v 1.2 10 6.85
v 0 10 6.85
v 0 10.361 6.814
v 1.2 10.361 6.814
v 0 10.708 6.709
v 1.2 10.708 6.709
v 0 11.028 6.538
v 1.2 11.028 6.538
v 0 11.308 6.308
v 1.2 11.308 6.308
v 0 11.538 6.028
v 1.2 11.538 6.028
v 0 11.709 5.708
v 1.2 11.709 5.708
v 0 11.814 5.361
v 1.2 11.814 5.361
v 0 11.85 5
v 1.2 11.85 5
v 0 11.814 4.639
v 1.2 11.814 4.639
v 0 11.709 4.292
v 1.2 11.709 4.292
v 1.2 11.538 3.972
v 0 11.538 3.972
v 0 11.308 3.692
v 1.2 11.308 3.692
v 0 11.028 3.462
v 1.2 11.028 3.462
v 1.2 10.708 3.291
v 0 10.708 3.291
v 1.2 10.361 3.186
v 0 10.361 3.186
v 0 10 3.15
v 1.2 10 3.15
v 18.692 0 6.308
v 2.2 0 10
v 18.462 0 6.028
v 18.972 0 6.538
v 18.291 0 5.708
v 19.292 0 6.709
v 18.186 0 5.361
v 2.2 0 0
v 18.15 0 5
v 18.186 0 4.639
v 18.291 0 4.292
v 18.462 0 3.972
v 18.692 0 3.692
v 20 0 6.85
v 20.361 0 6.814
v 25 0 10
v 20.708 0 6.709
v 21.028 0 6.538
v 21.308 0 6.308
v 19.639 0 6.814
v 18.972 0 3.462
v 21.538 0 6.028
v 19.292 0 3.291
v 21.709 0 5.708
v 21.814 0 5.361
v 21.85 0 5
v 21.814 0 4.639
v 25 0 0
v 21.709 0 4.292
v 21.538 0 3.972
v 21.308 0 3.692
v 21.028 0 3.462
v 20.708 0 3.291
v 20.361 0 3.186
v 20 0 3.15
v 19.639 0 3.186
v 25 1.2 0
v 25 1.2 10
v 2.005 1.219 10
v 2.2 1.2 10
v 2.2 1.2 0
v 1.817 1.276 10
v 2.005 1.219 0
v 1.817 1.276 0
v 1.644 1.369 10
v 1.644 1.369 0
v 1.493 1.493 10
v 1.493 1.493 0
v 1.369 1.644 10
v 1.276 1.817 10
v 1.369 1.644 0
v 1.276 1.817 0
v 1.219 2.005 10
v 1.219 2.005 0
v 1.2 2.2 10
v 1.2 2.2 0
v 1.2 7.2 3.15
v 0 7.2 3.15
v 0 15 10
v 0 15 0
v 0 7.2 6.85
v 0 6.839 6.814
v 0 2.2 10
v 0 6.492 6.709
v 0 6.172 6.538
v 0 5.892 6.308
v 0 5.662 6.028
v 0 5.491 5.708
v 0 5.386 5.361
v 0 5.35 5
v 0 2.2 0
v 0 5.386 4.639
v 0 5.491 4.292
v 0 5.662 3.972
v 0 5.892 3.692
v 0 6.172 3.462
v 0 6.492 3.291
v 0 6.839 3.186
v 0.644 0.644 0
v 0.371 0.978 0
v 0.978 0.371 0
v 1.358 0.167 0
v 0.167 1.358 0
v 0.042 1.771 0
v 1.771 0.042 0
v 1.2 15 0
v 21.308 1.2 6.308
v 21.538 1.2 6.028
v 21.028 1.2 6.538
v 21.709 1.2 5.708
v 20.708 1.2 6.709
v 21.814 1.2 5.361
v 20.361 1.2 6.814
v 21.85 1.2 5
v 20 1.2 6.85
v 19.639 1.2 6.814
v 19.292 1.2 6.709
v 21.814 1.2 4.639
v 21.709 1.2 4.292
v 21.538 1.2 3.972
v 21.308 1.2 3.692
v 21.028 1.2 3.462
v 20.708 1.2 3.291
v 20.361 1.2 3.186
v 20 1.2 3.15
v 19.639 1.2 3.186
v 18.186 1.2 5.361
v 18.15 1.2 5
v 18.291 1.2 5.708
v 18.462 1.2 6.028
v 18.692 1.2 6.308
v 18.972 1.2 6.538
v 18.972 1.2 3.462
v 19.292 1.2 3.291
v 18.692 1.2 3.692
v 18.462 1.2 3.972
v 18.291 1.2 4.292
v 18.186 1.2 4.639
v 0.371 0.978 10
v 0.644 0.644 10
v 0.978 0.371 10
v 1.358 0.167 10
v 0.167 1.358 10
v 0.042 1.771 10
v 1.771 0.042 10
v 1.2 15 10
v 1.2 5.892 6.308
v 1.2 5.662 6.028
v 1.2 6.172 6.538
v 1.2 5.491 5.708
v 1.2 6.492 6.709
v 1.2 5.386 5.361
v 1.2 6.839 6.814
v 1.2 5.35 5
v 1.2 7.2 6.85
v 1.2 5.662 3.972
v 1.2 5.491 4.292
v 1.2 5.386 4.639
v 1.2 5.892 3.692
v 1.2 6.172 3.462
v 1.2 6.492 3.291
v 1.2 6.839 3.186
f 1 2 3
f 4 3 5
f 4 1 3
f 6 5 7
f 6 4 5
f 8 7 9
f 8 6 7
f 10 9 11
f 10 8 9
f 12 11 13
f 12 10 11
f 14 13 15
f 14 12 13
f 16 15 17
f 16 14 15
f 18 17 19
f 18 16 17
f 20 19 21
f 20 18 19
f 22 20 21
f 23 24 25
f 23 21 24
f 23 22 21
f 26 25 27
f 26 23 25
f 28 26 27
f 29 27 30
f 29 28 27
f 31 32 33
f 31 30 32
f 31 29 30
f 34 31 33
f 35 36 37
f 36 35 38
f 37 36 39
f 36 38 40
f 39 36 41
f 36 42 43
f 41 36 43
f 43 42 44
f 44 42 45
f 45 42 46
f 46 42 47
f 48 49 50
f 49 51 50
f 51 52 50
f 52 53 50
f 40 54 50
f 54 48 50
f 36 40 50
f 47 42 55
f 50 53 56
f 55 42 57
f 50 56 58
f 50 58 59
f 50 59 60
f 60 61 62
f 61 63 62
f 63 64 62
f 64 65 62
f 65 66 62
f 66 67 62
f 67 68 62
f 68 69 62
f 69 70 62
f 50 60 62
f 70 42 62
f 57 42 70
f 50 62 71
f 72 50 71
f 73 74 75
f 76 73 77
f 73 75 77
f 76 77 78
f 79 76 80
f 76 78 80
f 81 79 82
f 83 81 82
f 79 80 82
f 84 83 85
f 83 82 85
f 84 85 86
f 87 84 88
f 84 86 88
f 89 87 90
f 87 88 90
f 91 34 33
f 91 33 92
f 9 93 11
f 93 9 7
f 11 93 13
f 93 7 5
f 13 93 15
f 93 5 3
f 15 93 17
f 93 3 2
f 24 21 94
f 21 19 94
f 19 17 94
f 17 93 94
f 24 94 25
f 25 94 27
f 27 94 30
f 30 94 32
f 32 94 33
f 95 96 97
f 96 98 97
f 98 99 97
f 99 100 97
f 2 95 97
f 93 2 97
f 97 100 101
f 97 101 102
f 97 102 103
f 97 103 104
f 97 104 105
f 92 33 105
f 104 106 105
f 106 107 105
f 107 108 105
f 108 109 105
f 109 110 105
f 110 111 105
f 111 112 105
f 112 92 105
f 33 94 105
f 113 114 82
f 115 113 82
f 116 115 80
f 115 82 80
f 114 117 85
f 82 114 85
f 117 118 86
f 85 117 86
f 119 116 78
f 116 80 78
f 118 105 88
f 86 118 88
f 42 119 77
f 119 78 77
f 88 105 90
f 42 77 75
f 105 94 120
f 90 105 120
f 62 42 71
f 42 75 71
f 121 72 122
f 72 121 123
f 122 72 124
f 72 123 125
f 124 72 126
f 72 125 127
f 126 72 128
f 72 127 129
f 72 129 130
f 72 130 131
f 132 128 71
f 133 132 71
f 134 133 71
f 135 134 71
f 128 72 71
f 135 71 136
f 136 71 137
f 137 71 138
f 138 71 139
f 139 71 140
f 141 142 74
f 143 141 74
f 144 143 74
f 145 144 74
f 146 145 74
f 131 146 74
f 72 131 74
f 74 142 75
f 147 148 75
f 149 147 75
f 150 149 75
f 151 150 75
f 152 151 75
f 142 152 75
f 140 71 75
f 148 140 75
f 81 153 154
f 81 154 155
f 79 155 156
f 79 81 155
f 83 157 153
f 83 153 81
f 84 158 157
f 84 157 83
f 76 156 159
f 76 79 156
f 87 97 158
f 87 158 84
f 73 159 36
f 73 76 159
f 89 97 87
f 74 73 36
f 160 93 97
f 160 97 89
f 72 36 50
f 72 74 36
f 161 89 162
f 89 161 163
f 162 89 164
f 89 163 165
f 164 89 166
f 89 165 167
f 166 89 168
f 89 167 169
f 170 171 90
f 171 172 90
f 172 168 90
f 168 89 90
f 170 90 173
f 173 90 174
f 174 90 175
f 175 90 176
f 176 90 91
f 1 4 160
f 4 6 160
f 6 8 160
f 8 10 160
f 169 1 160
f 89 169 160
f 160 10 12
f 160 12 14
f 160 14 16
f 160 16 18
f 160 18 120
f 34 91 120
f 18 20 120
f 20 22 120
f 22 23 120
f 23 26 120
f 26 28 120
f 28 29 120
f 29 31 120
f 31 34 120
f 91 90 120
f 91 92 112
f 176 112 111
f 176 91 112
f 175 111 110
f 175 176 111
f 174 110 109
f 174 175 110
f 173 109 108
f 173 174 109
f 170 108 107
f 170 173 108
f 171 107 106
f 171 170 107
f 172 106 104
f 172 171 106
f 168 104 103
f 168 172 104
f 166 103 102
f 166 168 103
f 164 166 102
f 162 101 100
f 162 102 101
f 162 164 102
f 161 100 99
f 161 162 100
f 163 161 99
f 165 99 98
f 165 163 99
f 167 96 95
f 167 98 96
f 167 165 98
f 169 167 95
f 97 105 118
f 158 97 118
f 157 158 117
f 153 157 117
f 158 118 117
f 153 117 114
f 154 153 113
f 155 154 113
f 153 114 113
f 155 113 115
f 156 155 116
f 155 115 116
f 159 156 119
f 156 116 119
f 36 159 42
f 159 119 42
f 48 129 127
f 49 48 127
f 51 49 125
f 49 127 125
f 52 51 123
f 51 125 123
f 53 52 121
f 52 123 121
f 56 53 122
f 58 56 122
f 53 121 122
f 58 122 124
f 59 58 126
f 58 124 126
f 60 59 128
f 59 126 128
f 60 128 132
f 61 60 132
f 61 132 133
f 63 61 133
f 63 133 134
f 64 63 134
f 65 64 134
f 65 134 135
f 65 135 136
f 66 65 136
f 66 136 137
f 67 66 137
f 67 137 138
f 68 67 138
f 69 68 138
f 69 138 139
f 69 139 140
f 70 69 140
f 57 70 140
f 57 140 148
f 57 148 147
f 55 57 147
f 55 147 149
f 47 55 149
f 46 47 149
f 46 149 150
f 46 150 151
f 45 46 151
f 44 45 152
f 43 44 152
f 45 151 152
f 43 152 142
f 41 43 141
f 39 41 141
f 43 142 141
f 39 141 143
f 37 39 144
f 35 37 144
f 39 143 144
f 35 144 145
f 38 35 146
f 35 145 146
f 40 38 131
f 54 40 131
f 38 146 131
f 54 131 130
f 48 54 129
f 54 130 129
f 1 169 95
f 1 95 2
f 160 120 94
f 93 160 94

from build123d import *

# Parameters (mm, degrees)
T_LE_DE_BASE_PLI_E1_DEPTH = 10
ENL_V_MAT_EXTRU_1_REACH   = 32.256
ESQUISSE6_R               = 1.85
ENL_V_MAT_EXTRU_2_REACH   = 31.857


# Sheet-metal steps are written as plain solids
with BuildPart() as part:
    # Esquisse1 → Tôle de base pliée1 (new body)
    with BuildSketch(Plane.XY):
        with BuildLine():
            Line((0, 15), (0, 2.2))
            ThreePointArc((0, 2.2), (0.644365081, 0.644365081), (2.2, 0))
            Line((2.2, 0), (25, 0))
            Line((25, 0), (25, 1.2))
            Line((25, 1.2), (2.2, 1.2))
            ThreePointArc((2.2, 1.2), (1.492893219, 1.492893219), (1.2, 2.2))
            Line((1.2, 2.2), (1.2, 15))
            Line((1.2, 15), (0, 15))
        make_face()
    extrude(amount=T_LE_DE_BASE_PLI_E1_DEPTH)

    # Esquisse6 → Enlèv. mat.-Extru.1 (cut, up to next)
    with BuildSketch(Plane(origin=(0, 1.2, 0), x_dir=(1, 0, 0), z_dir=(0, 1, 0)), mode=Mode.PRIVATE) as enl_v_mat_extru_1_sk1:
        with Locations(Location((20, -5, 0), (0, 0, 270))):
            Circle(ESQUISSE6_R)
    enl_v_mat_extru_1_tool1 = extrude(enl_v_mat_extru_1_sk1.sketch, amount=-ENL_V_MAT_EXTRU_1_REACH, mode=Mode.PRIVATE) & part.part
    add(enl_v_mat_extru_1_tool1.solids().sort_by_distance((20, 1.2, 5))[0], mode=Mode.SUBTRACT)

    # Esquisse7 → Enlèv. mat.-Extru.2 (cut, up to next)
    with BuildSketch(Plane(origin=(1.2, 0, 0), x_dir=(0, 0, -1), z_dir=(1, 0, 0)), mode=Mode.PRIVATE) as enl_v_mat_extru_2_sk1:
        with BuildLine():
            Line((-3.15, 10), (-3.15, 7.2))
            ThreePointArc((-3.15, 7.2), (-5, 5.35), (-6.85, 7.2))
            Line((-6.85, 7.2), (-6.85, 10))
            ThreePointArc((-6.85, 10), (-5, 11.85), (-3.15, 10))
        make_face()
    enl_v_mat_extru_2_tool1 = extrude(enl_v_mat_extru_2_sk1.sketch, amount=-ENL_V_MAT_EXTRU_2_REACH, mode=Mode.PRIVATE) & part.part
    add(enl_v_mat_extru_2_tool1.solids().sort_by_distance((1.2, 8.6, 5))[0], mode=Mode.SUBTRACT)


solid = part.part
